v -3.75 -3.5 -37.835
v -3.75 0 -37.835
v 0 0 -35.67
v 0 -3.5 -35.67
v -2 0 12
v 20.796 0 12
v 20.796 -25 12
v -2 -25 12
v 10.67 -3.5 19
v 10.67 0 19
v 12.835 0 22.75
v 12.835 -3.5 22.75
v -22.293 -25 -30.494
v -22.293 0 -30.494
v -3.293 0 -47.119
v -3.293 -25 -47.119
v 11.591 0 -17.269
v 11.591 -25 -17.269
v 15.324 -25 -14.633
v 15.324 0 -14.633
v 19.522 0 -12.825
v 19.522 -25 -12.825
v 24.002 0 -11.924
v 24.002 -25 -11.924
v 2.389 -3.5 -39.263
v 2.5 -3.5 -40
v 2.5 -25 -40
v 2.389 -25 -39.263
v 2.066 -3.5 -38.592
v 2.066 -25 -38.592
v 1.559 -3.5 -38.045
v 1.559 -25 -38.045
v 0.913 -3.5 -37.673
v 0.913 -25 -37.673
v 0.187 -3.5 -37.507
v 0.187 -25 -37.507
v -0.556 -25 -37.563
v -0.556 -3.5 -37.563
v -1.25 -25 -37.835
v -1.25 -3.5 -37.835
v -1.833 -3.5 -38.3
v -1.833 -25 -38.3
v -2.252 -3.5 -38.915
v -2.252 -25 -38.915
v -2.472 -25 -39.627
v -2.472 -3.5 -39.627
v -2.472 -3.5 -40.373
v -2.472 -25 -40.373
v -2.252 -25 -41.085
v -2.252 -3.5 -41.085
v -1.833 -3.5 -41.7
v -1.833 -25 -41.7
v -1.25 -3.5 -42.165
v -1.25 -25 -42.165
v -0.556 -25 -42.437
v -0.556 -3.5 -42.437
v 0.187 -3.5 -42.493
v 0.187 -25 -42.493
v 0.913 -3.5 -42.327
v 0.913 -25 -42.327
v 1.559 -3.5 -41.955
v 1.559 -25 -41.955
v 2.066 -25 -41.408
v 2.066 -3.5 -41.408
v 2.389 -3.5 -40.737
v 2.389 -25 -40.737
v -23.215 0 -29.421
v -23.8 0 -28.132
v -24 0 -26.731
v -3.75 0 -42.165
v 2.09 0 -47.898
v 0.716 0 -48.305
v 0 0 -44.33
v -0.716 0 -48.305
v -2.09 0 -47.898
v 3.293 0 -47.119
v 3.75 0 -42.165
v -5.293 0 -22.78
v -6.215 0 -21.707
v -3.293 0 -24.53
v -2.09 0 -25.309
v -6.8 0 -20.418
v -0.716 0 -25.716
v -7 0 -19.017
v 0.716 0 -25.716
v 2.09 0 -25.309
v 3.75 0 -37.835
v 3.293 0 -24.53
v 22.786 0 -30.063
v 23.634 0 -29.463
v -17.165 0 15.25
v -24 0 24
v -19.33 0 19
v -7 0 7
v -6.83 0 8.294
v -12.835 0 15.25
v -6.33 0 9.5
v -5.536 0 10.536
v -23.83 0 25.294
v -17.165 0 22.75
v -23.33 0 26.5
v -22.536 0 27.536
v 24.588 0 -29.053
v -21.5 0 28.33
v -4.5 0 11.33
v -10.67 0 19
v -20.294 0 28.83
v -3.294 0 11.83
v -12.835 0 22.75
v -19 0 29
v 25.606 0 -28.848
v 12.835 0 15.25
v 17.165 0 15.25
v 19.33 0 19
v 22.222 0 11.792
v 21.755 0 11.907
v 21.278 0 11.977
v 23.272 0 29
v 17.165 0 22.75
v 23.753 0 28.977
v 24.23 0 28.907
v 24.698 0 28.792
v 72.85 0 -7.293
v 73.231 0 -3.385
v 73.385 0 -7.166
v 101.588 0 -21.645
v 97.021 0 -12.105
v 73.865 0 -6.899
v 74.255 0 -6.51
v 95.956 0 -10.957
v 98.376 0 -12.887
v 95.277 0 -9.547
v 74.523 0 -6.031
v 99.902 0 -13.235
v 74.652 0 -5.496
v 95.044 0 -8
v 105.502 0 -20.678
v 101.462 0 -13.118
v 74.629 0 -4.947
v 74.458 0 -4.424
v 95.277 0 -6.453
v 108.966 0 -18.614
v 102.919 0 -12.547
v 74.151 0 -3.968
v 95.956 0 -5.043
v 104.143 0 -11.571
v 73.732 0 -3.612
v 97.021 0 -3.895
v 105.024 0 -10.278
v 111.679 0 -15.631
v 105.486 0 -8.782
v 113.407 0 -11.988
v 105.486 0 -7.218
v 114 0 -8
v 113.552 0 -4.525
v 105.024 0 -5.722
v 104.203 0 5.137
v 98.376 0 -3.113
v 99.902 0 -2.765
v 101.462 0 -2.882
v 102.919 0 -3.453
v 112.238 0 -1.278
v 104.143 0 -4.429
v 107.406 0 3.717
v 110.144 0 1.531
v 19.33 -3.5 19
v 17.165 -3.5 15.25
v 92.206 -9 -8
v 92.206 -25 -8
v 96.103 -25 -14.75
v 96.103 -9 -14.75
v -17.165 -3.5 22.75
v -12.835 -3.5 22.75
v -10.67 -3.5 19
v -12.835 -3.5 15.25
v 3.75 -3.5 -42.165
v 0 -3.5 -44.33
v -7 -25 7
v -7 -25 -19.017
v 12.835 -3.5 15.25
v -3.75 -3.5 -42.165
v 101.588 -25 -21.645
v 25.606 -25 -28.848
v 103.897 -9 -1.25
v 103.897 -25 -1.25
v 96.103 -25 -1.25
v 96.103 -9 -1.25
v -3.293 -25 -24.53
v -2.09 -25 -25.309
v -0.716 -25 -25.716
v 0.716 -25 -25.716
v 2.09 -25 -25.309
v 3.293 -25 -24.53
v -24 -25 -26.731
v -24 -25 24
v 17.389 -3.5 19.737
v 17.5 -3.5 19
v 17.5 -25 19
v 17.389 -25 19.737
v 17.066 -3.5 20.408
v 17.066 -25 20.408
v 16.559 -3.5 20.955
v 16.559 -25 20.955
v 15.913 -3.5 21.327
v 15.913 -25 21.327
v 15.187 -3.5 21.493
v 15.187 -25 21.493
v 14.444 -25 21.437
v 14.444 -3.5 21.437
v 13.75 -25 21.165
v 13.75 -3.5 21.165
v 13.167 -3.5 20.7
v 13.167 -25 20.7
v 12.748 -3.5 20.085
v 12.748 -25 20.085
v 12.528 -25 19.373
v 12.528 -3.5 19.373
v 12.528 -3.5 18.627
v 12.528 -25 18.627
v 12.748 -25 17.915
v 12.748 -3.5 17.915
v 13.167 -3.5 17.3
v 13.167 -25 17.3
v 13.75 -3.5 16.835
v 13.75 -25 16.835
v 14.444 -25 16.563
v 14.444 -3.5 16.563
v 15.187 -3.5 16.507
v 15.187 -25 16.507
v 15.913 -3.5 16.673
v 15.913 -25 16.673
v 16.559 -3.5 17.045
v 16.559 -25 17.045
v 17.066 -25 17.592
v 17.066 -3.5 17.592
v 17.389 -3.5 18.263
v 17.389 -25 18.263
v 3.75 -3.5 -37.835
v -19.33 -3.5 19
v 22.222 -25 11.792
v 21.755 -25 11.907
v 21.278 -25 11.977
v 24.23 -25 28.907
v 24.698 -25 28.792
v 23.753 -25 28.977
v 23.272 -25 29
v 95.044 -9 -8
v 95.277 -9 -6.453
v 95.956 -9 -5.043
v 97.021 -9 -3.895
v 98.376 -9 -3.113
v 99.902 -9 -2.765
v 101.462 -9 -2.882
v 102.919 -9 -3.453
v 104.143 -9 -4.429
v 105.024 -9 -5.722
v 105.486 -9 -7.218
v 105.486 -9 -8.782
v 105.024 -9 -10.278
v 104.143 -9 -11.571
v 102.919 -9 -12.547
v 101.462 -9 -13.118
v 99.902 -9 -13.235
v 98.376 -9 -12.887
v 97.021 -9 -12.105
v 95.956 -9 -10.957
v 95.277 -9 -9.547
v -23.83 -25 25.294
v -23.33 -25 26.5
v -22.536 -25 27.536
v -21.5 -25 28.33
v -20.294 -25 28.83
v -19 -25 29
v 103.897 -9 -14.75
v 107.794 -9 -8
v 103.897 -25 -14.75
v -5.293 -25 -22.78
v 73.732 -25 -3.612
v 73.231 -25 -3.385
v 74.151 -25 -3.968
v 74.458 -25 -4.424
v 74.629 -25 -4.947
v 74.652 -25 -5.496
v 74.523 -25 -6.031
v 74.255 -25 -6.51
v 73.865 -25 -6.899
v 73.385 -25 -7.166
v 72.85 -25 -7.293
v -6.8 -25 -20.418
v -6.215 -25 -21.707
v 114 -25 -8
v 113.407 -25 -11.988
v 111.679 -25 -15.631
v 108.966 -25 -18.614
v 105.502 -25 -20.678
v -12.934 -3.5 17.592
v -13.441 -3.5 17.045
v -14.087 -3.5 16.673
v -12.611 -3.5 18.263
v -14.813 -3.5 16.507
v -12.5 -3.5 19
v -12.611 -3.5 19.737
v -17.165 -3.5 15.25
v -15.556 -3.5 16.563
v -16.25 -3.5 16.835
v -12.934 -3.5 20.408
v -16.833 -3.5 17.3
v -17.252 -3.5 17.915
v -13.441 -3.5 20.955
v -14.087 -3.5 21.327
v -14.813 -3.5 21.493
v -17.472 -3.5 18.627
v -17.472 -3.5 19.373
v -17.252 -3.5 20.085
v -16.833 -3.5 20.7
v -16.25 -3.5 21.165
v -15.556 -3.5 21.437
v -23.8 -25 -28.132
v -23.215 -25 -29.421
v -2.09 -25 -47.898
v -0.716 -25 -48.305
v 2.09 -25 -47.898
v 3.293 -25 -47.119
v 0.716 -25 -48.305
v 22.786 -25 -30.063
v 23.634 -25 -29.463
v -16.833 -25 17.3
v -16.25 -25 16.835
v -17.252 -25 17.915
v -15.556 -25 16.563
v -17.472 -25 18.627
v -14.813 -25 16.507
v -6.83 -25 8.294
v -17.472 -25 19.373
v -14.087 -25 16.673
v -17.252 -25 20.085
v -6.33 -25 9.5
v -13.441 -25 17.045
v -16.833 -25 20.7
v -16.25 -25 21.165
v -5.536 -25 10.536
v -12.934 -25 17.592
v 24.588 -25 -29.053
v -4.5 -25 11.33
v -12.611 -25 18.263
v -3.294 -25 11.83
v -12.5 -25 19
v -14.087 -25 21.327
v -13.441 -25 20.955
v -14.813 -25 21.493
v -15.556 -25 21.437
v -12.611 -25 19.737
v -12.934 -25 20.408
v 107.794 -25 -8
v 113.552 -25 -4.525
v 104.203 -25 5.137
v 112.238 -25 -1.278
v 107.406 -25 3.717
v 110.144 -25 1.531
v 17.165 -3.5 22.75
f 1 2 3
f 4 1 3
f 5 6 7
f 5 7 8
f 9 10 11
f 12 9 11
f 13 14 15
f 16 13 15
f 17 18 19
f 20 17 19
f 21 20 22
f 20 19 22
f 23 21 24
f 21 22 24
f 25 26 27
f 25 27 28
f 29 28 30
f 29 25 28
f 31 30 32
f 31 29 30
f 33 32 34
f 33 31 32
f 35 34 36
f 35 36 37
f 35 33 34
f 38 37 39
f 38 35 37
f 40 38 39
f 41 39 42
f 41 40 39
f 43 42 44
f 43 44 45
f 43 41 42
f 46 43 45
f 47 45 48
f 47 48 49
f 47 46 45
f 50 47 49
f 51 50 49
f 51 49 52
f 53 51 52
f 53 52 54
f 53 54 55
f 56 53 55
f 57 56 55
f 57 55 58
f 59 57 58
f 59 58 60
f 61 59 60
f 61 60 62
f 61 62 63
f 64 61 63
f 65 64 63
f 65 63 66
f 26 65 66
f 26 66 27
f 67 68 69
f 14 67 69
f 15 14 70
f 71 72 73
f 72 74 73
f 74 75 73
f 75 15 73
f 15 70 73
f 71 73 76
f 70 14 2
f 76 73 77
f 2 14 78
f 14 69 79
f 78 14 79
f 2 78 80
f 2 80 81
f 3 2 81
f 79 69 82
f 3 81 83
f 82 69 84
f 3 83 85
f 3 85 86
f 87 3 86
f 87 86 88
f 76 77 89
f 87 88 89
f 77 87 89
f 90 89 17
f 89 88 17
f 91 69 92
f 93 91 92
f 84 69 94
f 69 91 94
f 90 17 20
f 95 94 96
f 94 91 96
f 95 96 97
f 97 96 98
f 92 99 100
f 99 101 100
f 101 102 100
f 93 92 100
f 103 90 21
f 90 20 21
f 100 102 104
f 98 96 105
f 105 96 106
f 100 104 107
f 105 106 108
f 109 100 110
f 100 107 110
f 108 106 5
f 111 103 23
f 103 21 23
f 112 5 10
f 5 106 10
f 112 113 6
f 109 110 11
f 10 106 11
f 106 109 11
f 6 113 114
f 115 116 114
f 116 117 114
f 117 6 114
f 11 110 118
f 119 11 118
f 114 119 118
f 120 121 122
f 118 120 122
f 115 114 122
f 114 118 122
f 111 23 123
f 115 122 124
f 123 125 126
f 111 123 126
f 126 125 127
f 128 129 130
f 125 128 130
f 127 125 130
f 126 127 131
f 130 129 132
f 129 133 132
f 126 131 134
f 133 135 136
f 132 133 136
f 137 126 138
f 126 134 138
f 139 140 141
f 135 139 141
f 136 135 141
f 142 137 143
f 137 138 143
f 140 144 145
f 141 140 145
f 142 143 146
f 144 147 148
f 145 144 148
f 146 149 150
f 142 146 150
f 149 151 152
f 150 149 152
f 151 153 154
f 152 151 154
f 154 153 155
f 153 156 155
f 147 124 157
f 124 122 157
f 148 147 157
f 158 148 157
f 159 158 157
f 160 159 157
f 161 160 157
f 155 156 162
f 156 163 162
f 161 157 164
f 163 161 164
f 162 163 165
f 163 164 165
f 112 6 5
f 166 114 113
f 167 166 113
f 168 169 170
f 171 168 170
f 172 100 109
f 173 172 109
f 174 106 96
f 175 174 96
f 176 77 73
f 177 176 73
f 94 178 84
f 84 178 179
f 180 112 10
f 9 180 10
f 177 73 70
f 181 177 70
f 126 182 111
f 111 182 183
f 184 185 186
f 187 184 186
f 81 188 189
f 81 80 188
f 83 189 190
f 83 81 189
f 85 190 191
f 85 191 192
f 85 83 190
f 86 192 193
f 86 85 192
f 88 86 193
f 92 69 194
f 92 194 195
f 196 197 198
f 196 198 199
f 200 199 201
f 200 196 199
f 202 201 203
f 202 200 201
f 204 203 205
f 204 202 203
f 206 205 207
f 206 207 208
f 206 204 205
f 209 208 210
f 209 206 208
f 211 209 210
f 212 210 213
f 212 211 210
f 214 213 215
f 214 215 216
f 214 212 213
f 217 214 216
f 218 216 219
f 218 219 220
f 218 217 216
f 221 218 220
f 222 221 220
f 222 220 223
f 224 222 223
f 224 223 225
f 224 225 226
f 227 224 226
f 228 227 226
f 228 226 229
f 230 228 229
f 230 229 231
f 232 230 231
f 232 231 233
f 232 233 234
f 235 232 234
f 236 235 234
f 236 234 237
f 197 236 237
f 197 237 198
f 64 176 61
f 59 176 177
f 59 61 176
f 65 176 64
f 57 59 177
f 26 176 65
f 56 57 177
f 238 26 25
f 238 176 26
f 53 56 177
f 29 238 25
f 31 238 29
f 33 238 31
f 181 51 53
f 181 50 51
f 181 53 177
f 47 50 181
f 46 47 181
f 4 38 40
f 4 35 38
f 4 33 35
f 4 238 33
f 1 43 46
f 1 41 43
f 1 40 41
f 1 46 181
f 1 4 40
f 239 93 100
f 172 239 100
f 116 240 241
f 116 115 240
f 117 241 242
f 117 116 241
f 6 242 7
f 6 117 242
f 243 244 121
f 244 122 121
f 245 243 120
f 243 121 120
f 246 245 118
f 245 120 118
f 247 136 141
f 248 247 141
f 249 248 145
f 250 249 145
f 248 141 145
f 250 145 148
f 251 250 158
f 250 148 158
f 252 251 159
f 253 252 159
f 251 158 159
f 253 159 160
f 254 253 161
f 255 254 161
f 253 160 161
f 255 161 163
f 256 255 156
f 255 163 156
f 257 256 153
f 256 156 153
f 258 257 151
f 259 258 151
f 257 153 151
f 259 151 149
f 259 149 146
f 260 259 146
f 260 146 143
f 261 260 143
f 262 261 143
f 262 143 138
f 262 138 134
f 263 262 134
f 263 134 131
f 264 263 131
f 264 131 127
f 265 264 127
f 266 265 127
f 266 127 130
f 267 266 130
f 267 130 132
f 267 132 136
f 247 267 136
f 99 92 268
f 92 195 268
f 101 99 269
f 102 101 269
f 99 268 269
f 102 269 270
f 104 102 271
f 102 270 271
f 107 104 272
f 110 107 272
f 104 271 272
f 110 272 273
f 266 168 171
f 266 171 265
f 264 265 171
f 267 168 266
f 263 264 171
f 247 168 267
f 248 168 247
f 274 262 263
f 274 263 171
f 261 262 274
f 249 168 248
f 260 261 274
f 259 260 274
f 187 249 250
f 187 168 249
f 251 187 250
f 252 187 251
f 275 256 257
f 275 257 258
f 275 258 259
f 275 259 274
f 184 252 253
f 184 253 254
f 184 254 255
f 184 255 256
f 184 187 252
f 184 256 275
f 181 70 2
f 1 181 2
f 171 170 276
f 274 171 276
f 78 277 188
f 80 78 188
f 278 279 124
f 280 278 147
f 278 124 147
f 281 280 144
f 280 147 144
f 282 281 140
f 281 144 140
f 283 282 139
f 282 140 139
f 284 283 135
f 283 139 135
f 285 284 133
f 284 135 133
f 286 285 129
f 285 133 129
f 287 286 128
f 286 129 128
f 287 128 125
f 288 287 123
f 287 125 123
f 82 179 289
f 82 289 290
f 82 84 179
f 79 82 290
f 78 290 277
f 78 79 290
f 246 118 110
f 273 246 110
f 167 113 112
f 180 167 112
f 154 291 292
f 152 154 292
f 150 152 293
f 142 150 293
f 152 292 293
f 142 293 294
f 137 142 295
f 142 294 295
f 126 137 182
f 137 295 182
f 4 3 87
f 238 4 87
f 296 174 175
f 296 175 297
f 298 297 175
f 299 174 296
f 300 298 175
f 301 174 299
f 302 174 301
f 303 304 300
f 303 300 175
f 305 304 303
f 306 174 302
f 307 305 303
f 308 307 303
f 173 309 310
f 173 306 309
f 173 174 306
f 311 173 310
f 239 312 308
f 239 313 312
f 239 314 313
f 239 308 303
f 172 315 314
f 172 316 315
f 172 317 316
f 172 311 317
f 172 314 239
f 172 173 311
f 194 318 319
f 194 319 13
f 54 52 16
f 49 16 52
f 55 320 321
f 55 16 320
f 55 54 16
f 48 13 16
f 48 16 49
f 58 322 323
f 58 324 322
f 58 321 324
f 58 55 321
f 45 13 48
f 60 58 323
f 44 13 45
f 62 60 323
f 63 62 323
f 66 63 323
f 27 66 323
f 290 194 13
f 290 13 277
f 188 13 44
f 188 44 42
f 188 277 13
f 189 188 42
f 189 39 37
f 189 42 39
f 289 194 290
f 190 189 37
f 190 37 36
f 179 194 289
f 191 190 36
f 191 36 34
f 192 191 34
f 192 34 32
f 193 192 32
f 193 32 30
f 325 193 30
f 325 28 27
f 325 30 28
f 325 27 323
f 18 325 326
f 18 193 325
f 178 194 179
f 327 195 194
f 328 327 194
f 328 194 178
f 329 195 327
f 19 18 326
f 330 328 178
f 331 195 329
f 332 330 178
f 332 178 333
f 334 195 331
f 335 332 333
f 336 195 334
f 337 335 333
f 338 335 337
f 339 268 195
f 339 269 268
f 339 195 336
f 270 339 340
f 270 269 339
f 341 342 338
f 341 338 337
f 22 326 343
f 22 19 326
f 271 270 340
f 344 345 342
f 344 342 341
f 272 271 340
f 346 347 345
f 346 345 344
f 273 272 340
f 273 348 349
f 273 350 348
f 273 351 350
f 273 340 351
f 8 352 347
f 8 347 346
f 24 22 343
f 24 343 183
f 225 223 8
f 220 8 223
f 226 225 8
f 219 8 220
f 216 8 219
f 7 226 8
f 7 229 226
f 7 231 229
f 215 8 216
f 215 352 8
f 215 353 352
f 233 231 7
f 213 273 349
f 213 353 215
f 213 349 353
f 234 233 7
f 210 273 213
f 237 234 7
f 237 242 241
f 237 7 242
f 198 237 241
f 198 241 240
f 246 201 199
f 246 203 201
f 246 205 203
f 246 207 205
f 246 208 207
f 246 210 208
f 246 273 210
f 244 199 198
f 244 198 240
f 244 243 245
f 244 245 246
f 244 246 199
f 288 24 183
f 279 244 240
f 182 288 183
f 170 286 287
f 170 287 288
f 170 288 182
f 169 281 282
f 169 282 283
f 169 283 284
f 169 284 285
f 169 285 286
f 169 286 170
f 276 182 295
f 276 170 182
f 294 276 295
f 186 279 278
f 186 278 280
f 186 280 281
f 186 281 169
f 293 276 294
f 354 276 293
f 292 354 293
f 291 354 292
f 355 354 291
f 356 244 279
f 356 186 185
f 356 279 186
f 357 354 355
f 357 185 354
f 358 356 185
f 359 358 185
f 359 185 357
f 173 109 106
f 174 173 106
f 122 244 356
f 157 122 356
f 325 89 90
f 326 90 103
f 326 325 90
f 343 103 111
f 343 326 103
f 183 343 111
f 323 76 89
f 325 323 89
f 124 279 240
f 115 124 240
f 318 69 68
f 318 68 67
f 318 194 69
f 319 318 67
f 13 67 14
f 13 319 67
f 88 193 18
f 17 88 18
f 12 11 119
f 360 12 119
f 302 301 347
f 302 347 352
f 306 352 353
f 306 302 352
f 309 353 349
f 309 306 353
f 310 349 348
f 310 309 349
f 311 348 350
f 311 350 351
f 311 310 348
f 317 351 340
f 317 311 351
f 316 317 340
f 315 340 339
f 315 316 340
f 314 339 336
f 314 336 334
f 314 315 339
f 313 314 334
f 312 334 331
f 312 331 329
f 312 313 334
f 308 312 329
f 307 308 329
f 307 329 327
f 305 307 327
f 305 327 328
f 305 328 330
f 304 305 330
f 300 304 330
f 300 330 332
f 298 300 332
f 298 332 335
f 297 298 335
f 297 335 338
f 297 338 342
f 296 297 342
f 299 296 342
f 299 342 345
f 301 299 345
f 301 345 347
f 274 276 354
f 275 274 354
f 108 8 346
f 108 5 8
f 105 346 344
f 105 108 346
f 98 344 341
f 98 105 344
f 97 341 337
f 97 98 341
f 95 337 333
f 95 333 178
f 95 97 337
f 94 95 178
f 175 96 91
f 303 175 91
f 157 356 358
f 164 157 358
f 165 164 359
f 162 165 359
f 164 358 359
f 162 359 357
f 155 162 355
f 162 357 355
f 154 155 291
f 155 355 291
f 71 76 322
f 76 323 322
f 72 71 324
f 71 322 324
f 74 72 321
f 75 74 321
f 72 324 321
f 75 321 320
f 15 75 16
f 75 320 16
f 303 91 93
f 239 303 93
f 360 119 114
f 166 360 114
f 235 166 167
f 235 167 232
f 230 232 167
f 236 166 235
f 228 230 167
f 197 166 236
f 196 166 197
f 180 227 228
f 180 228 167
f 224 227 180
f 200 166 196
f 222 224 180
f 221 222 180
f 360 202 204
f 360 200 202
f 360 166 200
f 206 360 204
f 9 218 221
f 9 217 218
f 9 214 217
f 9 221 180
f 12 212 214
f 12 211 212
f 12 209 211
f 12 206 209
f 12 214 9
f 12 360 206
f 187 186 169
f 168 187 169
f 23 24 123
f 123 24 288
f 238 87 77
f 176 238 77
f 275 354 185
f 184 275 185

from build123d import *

# Parameters (mm, degrees)
F0_W      = 48
F0_H      = 58
F0_R      = 2.5
F0_W_2    = 90
F1_DEPTH  = 25
F3_DEPTH  = 16
F5_D      = 10.5
F7_DEPTH  = 25
F8_R      = 2.5
F9_DEPTH  = 3.5
F10_R     = 5
F12_DEPTH = 25.001
F13_R     = 5
F14_R     = 2


with BuildPart() as f1:
    # F0 (on Front) → F1 (new body)
    with BuildSketch(Plane.XZ):
        Rectangle(F0_W, F0_H)
        with Locations((-15, 19)):
            Circle(F0_R, mode=Mode.SUBTRACT)
        with Locations((15, 19)):
            Circle(F0_R, mode=Mode.SUBTRACT)
        with Locations((69, 0)):
            Rectangle(F0_W_2, F0_H)
        Polygon((24, -29), (-24, -29), (0, -50), align=None)
        with Locations((0, -40)):
            Circle(F0_R, mode=Mode.SUBTRACT)
    extrude(amount=F1_DEPTH)

    # F2 (on face) → F3 (cut)
    with BuildSketch(Plane.XZ.offset(25)):
        Polygon((96.102885683, -14.75), (103.897114317, -14.75), (107.7942286341, -8), (103.897114317, -1.25), (96.102885683, -1.25), (92.2057713659, -8), align=None)
    extrude(amount=-F3_DEPTH, mode=Mode.SUBTRACT)

    # F5 (through all)
    with Locations(Plane.XZ.offset(9)):
        with Locations((100.2942286341, -8)):
            Hole(F5_D / 2)

    # F6 (on face) → F7 (cut)
    with BuildSketch(Plane.XZ.offset(25)):
        with BuildLine():
            Line((114, 29), (24, 29))
            Line((24, 29), (104.2028684125, 5.1366169092))
            ThreePointArc((104.2028684125, 5.1366169092), (111.2810182281, 0.1938161532), (114, -7.9999999449))
            Line((114, -7.9999999449), (114, 29))
        make_face()
        with BuildLine():
            Line((114, -29), (114, -7.9999999449))
            ThreePointArc((114, -7.9999999449), (110.432692445, -17.222782676), (101.5877514086, -21.6445948114))
            Line((101.5877514086, -21.6445948114), (24, -29))
            Line((24, -29), (114, -29))
        make_face()
    extrude(amount=-F7_DEPTH, mode=Mode.SUBTRACT)

    # F8 (on face) → F9 (cut)
    with BuildSketch(Plane(origin=(0, 0, 0), x_dir=(-1, 0, 0), z_dir=(0, 1, 0))):
        Polygon((12.8349364905, 15.25), (17.1650635095, 15.25), (19.3301270189, 19), (17.1650635095, 22.75), (12.8349364905, 22.75), (10.6698729811, 19), align=None)
        with Locations((15, 19)):
            Circle(F8_R, mode=Mode.SUBTRACT)
        Polygon((-17.1650635095, 15.25), (-12.8349364905, 15.25), (-10.6698729811, 19), (-12.8349364905, 22.75), (-17.1650635095, 22.75), (-19.3301270189, 19), align=None)
        with Locations((-15, 19)):
            Circle(F8_R, mode=Mode.SUBTRACT)
        Polygon((-3.75, -42.1650635095), (0, -44.3301270189), (3.75, -42.1650635095), (3.75, -37.8349364905), (0, -35.6698729811), (-3.75, -37.8349364905), align=None)
        with Locations((0, -40)):
            Circle(F8_R, mode=Mode.SUBTRACT)
    extrude(amount=-F9_DEPTH, mode=Mode.SUBTRACT)

    # F10
    f10_edges = [f1.edges().sort_by_distance(p)[0] for p in [
        (-24, -12.5, 29),
        (24, -12.5, 29),
        (-24, -12.5, -29),
        (0, -12.5, -50),
        (24, -12.5, -29),
    ]]
    fillet(f10_edges, radius=F10_R)

    # F11 (on face) → F12 (cut, through all)
    with BuildSketch(Plane.XZ.offset(25)):
        with BuildLine():
            ThreePointArc((11.5911164871, -17.2687132217), (17.375962187, -13.6196897729), (24.0019026876, -11.9235988601))
            Line((24.0019026876, -11.9235988601), (83.1000312878, -6.3210304927))
            Line((83.1000312878, -6.3210304927), (21.5245542404, 12))
            Line((21.5245542404, 12), (-7, 12))
            Line((-7, 12), (-7, -21.2859401479))
            Line((-7, -21.2859401479), (0, -27.4109401479))
            Line((0, -27.4109401479), (11.5911164871, -17.2687132217))
        make_face()
    extrude(amount=-F12_DEPTH, mode=Mode.SUBTRACT)

    # F13
    f13_edges = [f1.edges().sort_by_distance(p)[0] for p in [
        (-7, -12.5, 12),
        (21.524554, -12.5, 12),
        (0, -12.5, -27.41094),
        (-7, -12.5, -21.28594),
    ]]
    fillet(f13_edges, radius=F13_R)

    # F14
    f14_edges = [f1.edges().sort_by_distance(p)[0] for p in [
        (83.100031, -12.5, -6.32103),
    ]]
    fillet(f14_edges, radius=F14_R)


solid = f1.part
